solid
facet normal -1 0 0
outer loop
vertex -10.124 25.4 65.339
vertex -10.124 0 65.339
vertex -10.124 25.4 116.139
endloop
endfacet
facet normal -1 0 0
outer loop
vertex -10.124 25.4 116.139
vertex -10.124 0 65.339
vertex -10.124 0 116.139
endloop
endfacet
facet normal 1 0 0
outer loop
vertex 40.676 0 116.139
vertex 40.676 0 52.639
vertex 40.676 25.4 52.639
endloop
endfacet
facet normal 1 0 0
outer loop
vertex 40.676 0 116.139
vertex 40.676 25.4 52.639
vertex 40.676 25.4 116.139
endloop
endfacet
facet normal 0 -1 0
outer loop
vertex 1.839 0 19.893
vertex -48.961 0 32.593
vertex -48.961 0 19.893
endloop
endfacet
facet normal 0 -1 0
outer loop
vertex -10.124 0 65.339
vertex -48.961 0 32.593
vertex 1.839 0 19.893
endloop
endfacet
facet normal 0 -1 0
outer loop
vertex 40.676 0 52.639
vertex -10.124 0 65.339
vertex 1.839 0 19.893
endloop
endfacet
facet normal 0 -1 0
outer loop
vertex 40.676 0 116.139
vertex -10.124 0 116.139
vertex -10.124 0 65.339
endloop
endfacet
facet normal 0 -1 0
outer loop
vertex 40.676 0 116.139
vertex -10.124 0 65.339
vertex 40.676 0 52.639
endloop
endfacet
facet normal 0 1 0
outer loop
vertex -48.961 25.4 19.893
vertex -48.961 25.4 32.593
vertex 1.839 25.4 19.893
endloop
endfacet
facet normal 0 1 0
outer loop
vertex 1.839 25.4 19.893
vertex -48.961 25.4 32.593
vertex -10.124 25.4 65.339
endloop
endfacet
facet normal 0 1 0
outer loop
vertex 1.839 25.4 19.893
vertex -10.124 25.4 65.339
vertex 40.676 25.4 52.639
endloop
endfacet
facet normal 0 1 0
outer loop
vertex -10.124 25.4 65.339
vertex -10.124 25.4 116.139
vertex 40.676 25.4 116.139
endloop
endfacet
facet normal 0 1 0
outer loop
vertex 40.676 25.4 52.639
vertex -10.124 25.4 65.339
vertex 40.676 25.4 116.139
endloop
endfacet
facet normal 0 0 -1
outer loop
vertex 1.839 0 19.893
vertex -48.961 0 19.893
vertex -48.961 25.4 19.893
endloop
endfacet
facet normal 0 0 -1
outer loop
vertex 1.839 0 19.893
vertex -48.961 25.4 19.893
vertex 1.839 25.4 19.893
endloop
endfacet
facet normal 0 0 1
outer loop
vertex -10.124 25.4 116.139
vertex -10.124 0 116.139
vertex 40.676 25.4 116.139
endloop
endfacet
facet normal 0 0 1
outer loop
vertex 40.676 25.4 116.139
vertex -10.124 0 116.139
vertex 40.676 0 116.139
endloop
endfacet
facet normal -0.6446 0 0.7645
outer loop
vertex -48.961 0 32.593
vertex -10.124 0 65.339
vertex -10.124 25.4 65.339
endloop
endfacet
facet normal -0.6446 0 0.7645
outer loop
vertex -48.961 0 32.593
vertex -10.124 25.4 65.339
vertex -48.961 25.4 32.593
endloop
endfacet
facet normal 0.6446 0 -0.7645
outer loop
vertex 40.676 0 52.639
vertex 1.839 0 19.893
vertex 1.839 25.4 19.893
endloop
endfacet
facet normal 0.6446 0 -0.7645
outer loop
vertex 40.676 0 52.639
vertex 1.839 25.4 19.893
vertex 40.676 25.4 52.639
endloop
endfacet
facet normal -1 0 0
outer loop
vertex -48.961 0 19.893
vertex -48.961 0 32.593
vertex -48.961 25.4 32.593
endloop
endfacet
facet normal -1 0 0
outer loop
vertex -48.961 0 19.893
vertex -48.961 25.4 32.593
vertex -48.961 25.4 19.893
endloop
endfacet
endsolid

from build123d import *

# Parameters (mm, degrees)
F0_W     = 50.8
F0_H     = 50.8
F1_DEPTH = 25.4


with BuildPart() as f1:
    # F0 (on Front) → F1 (new body)
    with BuildSketch(Plane.XZ):
        Polygon((-10.1240915534, 65.3393898586), (-48.9609619458, 32.592825182), (-33.8989773116, 32.592825182), (-10.1240915534, 52.6393898586), align=None)
        Polygon((-33.8989773116, 32.592825182), (-48.9609619458, 32.592825182), (-48.9609619458, 19.892825182), align=None)
        Polygon((1.8390380542, 32.592825182), (-33.8989773116, 32.592825182), (-48.9609619458, 19.892825182), (1.8390380542, 19.892825182), align=None)
        Polygon((40.6759084466, 65.3393898586), (-10.1240915534, 65.3393898586), (-10.1240915534, 52.6393898586), (25.6139238124, 52.6393898586), align=None)
        with Locations((15.2759084466, 90.7393898586)):
            Rectangle(F0_W, F0_H)
        Polygon((25.6139238124, 52.6393898586), (1.8390380542, 32.592825182), (1.8390380542, 19.892825182), (40.6759084466, 52.6393898586), align=None)
        Polygon((40.6759084466, 52.6393898586), (40.6759084466, 65.3393898586), (25.6139238124, 52.6393898586), align=None)
        Polygon((-10.1240915534, 52.6393898586), (-33.8989773116, 32.592825182), (1.8390380542, 32.592825182), (25.6139238124, 52.6393898586), align=None)
    extrude(amount=-F1_DEPTH)


solid = f1.part
